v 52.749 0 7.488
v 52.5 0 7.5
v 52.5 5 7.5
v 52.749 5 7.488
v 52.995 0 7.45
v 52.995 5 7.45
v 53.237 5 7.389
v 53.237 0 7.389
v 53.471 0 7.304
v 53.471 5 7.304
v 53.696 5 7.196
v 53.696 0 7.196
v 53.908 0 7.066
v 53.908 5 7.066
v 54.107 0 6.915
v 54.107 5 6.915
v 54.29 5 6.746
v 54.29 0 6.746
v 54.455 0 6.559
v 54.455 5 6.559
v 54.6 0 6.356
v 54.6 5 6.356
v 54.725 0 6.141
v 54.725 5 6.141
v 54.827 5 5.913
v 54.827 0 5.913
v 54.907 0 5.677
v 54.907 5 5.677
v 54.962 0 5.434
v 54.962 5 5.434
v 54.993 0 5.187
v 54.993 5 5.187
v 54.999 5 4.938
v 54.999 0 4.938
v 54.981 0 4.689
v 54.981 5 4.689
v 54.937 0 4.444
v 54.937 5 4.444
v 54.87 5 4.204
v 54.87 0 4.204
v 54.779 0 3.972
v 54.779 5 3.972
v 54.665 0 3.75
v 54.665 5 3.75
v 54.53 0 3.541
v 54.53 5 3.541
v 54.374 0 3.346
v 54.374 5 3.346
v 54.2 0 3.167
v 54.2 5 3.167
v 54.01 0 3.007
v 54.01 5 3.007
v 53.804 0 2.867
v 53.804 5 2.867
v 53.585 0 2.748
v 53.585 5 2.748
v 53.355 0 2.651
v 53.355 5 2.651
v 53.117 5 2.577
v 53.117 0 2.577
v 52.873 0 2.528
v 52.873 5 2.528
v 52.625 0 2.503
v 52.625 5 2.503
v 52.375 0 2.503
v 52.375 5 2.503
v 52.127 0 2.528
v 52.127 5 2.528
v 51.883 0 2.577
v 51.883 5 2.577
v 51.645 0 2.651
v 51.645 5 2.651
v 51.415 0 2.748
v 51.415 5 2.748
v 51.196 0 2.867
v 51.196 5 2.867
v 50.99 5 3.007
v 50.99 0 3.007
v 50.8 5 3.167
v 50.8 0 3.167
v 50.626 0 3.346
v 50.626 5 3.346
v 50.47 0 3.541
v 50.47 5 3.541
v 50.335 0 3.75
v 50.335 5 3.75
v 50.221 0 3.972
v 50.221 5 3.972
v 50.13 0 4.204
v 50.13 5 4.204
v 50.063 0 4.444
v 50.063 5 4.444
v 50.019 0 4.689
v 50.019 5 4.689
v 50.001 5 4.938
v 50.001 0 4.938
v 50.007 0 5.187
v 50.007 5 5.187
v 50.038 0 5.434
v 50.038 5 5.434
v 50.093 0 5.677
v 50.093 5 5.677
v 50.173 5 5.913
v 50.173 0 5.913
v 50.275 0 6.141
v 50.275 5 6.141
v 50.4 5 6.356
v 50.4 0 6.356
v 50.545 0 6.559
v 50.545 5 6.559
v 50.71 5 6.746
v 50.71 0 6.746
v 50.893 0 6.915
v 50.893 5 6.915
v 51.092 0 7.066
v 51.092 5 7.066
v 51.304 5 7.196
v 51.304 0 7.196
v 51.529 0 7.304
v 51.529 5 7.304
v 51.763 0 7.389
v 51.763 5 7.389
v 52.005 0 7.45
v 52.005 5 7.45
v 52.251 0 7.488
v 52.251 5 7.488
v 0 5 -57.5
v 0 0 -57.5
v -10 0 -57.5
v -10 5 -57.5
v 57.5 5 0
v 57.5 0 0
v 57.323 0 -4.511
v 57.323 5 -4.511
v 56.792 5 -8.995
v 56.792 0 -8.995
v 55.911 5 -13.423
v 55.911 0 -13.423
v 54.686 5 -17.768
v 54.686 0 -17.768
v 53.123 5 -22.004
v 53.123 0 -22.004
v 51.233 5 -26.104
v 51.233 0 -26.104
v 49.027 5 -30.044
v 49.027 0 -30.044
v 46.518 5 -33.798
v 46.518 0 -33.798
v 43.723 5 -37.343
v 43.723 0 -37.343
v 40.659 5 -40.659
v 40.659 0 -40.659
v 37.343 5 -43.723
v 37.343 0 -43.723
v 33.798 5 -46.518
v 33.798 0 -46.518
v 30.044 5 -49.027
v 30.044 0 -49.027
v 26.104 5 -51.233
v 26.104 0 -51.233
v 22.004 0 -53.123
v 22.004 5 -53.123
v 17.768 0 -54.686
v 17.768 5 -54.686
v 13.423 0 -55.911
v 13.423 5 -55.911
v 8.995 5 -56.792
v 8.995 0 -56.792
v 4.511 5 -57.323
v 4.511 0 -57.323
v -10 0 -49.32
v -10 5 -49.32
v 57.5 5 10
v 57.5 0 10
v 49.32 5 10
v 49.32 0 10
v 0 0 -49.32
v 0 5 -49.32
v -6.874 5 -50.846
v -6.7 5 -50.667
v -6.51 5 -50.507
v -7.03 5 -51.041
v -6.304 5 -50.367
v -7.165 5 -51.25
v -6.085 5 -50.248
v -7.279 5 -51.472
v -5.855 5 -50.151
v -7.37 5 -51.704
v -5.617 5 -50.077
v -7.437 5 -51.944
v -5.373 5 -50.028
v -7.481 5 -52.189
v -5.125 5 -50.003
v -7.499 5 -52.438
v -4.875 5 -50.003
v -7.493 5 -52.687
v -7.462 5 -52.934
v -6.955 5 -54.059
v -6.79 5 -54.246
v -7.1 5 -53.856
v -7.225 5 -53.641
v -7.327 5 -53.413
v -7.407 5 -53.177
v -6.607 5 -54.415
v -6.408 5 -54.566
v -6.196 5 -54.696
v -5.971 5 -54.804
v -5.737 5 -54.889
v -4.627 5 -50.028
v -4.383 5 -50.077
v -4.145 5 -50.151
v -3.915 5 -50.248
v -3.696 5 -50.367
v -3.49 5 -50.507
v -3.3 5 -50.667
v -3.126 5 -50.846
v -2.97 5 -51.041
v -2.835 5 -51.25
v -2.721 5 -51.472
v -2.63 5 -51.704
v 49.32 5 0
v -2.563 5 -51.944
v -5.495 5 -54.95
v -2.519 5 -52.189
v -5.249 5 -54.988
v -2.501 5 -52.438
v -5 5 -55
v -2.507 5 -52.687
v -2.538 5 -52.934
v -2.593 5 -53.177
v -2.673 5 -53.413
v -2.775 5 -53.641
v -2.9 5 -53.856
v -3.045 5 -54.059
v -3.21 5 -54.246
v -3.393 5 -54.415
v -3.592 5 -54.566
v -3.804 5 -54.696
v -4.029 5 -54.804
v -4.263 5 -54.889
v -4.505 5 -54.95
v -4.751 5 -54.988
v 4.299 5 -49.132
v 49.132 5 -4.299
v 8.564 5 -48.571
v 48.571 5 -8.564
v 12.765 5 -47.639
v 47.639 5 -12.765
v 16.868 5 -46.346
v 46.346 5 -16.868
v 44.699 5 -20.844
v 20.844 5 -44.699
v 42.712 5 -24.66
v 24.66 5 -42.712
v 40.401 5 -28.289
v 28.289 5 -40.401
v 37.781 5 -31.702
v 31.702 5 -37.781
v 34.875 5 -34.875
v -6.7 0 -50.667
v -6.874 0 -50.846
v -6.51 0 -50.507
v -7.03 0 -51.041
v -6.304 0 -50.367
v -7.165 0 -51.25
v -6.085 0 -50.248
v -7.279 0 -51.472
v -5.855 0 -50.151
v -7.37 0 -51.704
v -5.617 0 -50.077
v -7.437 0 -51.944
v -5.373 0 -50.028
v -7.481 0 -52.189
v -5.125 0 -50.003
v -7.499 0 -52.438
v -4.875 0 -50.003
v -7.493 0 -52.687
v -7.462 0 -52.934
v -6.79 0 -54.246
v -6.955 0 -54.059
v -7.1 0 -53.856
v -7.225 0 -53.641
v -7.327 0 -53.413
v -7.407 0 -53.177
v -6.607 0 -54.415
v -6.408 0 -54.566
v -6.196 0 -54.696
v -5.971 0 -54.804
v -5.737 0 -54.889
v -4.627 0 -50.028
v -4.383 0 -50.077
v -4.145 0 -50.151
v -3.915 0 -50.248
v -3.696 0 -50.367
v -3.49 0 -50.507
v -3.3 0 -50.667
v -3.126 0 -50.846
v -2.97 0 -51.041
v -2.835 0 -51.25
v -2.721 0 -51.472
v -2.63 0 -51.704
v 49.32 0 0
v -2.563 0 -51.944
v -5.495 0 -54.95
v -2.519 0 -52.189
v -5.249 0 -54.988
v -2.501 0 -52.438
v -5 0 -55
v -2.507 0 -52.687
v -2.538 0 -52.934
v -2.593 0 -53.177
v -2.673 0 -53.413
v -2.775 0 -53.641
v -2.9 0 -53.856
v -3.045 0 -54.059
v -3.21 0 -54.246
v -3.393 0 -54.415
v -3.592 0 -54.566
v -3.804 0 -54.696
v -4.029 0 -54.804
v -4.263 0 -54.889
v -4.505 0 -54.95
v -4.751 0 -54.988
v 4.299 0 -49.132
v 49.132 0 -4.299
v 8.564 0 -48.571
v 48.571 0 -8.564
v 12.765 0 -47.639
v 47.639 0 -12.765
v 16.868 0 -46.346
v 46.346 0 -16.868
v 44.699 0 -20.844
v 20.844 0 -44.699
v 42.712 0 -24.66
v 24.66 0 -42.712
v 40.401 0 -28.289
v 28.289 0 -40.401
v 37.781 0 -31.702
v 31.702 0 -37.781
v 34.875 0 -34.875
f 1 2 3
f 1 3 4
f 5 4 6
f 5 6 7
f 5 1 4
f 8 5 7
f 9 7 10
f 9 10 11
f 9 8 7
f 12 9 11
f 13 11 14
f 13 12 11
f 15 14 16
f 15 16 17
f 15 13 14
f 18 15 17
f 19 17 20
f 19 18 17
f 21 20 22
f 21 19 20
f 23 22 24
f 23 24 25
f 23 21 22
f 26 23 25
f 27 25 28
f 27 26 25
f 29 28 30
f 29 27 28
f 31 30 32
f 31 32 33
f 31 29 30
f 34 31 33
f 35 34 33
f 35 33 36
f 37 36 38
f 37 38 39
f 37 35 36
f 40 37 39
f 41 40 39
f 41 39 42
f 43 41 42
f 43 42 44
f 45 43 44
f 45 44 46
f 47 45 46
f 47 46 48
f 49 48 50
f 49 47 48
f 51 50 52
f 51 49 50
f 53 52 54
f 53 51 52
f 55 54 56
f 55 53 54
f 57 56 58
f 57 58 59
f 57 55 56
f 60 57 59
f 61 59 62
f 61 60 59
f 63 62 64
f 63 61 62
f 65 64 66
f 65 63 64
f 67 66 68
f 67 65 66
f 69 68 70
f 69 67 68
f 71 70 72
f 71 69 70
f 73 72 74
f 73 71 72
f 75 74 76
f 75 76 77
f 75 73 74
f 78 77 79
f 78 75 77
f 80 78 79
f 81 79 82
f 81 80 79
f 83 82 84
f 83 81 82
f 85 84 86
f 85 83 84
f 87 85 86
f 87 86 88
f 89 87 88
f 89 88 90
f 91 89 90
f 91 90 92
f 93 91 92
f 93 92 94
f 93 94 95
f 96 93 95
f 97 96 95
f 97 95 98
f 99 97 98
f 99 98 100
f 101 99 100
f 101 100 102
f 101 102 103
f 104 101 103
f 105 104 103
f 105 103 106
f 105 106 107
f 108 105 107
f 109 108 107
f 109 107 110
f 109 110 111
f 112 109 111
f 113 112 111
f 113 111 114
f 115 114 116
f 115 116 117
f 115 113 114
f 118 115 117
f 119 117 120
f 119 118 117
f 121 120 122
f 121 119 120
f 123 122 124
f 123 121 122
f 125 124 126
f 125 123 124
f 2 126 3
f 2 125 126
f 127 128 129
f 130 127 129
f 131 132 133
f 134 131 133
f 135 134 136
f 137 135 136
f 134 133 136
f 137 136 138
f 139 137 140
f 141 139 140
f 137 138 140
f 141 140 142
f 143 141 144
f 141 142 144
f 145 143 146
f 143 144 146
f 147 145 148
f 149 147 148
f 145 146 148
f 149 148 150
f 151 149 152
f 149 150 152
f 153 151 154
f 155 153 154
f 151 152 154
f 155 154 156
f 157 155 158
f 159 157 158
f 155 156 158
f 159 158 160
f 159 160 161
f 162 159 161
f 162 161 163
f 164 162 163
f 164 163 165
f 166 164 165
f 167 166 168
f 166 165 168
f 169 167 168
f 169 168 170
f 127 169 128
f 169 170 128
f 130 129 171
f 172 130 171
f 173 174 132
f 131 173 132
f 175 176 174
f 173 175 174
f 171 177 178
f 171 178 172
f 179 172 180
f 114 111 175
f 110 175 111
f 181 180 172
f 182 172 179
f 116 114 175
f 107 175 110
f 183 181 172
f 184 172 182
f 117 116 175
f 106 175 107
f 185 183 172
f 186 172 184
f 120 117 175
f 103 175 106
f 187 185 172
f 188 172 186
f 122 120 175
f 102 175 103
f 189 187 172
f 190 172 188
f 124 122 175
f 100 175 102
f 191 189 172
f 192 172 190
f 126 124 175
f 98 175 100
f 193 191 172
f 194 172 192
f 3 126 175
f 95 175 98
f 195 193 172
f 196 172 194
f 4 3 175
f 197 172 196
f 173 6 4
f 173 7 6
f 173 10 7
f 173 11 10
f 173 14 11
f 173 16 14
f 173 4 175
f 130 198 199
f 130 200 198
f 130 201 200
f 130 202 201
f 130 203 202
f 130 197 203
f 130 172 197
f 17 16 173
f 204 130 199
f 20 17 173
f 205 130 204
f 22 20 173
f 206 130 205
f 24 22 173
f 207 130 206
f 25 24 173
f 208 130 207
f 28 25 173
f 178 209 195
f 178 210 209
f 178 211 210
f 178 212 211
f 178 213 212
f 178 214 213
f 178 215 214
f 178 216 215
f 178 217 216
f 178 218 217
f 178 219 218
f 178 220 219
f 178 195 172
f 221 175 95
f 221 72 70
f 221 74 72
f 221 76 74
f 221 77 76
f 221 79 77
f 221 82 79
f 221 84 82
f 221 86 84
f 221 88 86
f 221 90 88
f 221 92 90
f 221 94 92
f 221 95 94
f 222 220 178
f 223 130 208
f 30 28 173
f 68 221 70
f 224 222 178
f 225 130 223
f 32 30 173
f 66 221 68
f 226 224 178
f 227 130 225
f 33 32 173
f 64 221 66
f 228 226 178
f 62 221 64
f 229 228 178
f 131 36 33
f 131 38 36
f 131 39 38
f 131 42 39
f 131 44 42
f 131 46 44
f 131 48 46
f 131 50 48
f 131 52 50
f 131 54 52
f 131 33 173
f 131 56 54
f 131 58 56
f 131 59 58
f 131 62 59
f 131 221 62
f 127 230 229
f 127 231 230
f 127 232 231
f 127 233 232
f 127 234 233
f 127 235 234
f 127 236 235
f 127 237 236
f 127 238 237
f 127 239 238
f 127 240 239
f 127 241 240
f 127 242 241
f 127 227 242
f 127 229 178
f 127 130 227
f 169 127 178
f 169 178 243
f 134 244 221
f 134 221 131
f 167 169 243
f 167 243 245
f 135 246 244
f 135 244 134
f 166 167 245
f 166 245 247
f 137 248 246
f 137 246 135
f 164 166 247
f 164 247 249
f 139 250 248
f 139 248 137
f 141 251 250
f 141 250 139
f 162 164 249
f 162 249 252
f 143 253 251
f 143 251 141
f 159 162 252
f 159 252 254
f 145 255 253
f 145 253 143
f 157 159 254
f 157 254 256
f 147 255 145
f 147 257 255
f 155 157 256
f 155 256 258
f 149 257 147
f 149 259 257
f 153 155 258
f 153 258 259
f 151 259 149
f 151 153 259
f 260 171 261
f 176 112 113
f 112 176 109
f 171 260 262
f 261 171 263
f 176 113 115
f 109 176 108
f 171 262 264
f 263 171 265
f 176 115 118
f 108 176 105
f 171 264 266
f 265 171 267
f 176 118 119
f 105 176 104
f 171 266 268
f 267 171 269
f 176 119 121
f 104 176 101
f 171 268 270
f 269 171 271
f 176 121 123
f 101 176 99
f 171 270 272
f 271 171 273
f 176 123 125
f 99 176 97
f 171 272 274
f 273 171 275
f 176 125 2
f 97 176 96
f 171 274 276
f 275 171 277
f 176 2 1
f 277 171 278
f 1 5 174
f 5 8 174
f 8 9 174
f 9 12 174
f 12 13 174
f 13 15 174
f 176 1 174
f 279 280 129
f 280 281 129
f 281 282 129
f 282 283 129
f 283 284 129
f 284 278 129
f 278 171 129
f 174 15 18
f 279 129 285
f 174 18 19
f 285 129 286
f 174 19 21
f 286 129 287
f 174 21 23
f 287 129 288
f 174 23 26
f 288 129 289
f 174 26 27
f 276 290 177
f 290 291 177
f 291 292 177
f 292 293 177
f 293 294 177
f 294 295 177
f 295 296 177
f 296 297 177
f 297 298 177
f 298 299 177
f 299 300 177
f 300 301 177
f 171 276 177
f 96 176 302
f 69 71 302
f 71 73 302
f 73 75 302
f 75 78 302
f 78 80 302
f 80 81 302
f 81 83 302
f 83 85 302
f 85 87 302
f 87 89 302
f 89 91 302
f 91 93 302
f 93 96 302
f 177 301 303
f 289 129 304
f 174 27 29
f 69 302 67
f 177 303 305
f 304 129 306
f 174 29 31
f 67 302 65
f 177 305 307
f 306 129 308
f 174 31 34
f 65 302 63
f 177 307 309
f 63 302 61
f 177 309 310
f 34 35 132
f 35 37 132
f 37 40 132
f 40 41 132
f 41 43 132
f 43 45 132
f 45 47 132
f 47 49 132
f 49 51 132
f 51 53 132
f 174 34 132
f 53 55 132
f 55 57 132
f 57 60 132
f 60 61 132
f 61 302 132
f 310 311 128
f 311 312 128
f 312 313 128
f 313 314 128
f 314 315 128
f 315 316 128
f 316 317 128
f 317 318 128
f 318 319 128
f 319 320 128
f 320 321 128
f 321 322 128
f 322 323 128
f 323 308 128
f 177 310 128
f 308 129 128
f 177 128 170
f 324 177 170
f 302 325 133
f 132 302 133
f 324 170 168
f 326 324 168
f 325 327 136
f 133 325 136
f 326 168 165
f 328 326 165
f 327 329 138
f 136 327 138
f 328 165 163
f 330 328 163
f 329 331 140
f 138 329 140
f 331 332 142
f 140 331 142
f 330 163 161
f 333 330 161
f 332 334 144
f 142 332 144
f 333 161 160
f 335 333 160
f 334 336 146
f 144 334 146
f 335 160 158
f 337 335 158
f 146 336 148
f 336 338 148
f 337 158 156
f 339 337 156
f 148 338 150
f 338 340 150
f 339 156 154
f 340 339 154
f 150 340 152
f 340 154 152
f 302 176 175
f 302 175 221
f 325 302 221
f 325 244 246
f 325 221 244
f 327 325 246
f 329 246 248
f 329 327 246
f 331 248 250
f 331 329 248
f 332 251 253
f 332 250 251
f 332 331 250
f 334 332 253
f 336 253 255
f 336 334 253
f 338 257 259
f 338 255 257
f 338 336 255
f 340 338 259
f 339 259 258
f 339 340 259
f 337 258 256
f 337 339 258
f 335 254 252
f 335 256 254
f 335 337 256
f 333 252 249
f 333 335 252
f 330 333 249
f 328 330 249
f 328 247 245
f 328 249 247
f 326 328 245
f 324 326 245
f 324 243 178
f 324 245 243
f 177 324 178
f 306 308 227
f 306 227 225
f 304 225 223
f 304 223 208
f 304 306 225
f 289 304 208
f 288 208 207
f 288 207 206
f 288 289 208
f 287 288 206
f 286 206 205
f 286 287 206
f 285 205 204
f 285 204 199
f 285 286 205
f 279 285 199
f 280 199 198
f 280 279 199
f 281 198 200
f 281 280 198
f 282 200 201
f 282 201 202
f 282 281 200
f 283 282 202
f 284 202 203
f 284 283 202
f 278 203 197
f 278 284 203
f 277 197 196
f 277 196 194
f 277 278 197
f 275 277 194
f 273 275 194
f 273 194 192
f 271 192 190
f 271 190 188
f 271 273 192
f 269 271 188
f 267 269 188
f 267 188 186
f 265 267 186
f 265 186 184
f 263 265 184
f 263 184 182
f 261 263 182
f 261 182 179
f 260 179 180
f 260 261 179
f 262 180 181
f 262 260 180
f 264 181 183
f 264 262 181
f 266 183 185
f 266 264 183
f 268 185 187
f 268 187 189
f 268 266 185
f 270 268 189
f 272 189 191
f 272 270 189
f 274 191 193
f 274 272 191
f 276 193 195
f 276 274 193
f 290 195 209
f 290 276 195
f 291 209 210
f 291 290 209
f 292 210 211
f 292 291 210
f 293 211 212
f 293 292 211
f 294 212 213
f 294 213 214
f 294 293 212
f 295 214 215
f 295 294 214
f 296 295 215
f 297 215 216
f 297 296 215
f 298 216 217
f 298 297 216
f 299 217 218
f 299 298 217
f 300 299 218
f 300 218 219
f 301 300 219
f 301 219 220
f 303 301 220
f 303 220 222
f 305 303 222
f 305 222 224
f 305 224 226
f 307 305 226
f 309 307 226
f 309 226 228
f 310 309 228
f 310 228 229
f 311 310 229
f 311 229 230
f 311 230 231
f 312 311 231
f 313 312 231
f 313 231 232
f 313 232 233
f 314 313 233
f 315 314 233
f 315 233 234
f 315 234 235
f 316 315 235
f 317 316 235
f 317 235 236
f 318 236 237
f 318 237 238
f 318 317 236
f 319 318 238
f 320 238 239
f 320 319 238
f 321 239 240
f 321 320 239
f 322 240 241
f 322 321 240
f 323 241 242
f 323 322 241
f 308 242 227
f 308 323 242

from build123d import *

# Parameters (mm, degrees)
SKETCH1_R              = 2.5
BOSS_EXTRUDE2_DEPTH    = 5
SPLIT1_SURFACE_1_BACK  = 96.59
SPLIT1_SURFACE_1_DEPTH = 193.18


with BuildPart() as part:
    # Sketch1 → Boss-Extrude2 (new body)
    with BuildSketch(Plane(origin=(0, 0, 0), x_dir=(1, 0, 0), z_dir=(0, 1, 0))):
        with BuildLine():
            Line((47.5, 0), (47.5, -10))
            Line((47.5, -10), (57.5, -10))
            Line((57.5, -10), (57.5, 0))
            ThreePointArc((57.5, 0), (40.658639918, 40.658639918), (0, 57.5))
            Line((0, 57.5), (-10, 57.5))
            Line((-10, 57.5), (-10, 47.5))
            Line((-10, 47.5), (0, 47.5))
            ThreePointArc((0, 47.5), (33.587572106, 33.587572106), (47.5, 0))
        make_face()
        with Locations(Location((52.5, -5, 0), (0, 0, 270))):
            Circle(SKETCH1_R, mode=Mode.SUBTRACT)
        with Locations(Location((-5, 52.5, 0), (0, 0, 90))):
            Circle(SKETCH1_R, mode=Mode.SUBTRACT)
    extrude(amount=BOSS_EXTRUDE2_DEPTH)

    # Split1: cut with a surface, the side behind it stays
    # Split1 surface: a surface, the sketch's curves swept straight by 193.18 mm
    with BuildLine(Plane(origin=(0, 5, 0), x_dir=(1, 0, 0), z_dir=(0, 1, 0)).offset(-SPLIT1_SURFACE_1_BACK), mode=Mode.PRIVATE) as split1_surface_1_path:
        Line((49.32, -10), (49.32, 0))
        ThreePointArc((49.32, 0), (34.874506448, 34.874506448), (0, 49.32))
        Line((0, 49.32), (-10, 49.32))
    split1_surface_1 = Shell.extrude(split1_surface_1_path.wire(), (0 * SPLIT1_SURFACE_1_DEPTH, 1 * SPLIT1_SURFACE_1_DEPTH, 0 * SPLIT1_SURFACE_1_DEPTH))
    split(bisect_by=split1_surface_1, keep=Keep.BOTTOM)


solid = part.part
